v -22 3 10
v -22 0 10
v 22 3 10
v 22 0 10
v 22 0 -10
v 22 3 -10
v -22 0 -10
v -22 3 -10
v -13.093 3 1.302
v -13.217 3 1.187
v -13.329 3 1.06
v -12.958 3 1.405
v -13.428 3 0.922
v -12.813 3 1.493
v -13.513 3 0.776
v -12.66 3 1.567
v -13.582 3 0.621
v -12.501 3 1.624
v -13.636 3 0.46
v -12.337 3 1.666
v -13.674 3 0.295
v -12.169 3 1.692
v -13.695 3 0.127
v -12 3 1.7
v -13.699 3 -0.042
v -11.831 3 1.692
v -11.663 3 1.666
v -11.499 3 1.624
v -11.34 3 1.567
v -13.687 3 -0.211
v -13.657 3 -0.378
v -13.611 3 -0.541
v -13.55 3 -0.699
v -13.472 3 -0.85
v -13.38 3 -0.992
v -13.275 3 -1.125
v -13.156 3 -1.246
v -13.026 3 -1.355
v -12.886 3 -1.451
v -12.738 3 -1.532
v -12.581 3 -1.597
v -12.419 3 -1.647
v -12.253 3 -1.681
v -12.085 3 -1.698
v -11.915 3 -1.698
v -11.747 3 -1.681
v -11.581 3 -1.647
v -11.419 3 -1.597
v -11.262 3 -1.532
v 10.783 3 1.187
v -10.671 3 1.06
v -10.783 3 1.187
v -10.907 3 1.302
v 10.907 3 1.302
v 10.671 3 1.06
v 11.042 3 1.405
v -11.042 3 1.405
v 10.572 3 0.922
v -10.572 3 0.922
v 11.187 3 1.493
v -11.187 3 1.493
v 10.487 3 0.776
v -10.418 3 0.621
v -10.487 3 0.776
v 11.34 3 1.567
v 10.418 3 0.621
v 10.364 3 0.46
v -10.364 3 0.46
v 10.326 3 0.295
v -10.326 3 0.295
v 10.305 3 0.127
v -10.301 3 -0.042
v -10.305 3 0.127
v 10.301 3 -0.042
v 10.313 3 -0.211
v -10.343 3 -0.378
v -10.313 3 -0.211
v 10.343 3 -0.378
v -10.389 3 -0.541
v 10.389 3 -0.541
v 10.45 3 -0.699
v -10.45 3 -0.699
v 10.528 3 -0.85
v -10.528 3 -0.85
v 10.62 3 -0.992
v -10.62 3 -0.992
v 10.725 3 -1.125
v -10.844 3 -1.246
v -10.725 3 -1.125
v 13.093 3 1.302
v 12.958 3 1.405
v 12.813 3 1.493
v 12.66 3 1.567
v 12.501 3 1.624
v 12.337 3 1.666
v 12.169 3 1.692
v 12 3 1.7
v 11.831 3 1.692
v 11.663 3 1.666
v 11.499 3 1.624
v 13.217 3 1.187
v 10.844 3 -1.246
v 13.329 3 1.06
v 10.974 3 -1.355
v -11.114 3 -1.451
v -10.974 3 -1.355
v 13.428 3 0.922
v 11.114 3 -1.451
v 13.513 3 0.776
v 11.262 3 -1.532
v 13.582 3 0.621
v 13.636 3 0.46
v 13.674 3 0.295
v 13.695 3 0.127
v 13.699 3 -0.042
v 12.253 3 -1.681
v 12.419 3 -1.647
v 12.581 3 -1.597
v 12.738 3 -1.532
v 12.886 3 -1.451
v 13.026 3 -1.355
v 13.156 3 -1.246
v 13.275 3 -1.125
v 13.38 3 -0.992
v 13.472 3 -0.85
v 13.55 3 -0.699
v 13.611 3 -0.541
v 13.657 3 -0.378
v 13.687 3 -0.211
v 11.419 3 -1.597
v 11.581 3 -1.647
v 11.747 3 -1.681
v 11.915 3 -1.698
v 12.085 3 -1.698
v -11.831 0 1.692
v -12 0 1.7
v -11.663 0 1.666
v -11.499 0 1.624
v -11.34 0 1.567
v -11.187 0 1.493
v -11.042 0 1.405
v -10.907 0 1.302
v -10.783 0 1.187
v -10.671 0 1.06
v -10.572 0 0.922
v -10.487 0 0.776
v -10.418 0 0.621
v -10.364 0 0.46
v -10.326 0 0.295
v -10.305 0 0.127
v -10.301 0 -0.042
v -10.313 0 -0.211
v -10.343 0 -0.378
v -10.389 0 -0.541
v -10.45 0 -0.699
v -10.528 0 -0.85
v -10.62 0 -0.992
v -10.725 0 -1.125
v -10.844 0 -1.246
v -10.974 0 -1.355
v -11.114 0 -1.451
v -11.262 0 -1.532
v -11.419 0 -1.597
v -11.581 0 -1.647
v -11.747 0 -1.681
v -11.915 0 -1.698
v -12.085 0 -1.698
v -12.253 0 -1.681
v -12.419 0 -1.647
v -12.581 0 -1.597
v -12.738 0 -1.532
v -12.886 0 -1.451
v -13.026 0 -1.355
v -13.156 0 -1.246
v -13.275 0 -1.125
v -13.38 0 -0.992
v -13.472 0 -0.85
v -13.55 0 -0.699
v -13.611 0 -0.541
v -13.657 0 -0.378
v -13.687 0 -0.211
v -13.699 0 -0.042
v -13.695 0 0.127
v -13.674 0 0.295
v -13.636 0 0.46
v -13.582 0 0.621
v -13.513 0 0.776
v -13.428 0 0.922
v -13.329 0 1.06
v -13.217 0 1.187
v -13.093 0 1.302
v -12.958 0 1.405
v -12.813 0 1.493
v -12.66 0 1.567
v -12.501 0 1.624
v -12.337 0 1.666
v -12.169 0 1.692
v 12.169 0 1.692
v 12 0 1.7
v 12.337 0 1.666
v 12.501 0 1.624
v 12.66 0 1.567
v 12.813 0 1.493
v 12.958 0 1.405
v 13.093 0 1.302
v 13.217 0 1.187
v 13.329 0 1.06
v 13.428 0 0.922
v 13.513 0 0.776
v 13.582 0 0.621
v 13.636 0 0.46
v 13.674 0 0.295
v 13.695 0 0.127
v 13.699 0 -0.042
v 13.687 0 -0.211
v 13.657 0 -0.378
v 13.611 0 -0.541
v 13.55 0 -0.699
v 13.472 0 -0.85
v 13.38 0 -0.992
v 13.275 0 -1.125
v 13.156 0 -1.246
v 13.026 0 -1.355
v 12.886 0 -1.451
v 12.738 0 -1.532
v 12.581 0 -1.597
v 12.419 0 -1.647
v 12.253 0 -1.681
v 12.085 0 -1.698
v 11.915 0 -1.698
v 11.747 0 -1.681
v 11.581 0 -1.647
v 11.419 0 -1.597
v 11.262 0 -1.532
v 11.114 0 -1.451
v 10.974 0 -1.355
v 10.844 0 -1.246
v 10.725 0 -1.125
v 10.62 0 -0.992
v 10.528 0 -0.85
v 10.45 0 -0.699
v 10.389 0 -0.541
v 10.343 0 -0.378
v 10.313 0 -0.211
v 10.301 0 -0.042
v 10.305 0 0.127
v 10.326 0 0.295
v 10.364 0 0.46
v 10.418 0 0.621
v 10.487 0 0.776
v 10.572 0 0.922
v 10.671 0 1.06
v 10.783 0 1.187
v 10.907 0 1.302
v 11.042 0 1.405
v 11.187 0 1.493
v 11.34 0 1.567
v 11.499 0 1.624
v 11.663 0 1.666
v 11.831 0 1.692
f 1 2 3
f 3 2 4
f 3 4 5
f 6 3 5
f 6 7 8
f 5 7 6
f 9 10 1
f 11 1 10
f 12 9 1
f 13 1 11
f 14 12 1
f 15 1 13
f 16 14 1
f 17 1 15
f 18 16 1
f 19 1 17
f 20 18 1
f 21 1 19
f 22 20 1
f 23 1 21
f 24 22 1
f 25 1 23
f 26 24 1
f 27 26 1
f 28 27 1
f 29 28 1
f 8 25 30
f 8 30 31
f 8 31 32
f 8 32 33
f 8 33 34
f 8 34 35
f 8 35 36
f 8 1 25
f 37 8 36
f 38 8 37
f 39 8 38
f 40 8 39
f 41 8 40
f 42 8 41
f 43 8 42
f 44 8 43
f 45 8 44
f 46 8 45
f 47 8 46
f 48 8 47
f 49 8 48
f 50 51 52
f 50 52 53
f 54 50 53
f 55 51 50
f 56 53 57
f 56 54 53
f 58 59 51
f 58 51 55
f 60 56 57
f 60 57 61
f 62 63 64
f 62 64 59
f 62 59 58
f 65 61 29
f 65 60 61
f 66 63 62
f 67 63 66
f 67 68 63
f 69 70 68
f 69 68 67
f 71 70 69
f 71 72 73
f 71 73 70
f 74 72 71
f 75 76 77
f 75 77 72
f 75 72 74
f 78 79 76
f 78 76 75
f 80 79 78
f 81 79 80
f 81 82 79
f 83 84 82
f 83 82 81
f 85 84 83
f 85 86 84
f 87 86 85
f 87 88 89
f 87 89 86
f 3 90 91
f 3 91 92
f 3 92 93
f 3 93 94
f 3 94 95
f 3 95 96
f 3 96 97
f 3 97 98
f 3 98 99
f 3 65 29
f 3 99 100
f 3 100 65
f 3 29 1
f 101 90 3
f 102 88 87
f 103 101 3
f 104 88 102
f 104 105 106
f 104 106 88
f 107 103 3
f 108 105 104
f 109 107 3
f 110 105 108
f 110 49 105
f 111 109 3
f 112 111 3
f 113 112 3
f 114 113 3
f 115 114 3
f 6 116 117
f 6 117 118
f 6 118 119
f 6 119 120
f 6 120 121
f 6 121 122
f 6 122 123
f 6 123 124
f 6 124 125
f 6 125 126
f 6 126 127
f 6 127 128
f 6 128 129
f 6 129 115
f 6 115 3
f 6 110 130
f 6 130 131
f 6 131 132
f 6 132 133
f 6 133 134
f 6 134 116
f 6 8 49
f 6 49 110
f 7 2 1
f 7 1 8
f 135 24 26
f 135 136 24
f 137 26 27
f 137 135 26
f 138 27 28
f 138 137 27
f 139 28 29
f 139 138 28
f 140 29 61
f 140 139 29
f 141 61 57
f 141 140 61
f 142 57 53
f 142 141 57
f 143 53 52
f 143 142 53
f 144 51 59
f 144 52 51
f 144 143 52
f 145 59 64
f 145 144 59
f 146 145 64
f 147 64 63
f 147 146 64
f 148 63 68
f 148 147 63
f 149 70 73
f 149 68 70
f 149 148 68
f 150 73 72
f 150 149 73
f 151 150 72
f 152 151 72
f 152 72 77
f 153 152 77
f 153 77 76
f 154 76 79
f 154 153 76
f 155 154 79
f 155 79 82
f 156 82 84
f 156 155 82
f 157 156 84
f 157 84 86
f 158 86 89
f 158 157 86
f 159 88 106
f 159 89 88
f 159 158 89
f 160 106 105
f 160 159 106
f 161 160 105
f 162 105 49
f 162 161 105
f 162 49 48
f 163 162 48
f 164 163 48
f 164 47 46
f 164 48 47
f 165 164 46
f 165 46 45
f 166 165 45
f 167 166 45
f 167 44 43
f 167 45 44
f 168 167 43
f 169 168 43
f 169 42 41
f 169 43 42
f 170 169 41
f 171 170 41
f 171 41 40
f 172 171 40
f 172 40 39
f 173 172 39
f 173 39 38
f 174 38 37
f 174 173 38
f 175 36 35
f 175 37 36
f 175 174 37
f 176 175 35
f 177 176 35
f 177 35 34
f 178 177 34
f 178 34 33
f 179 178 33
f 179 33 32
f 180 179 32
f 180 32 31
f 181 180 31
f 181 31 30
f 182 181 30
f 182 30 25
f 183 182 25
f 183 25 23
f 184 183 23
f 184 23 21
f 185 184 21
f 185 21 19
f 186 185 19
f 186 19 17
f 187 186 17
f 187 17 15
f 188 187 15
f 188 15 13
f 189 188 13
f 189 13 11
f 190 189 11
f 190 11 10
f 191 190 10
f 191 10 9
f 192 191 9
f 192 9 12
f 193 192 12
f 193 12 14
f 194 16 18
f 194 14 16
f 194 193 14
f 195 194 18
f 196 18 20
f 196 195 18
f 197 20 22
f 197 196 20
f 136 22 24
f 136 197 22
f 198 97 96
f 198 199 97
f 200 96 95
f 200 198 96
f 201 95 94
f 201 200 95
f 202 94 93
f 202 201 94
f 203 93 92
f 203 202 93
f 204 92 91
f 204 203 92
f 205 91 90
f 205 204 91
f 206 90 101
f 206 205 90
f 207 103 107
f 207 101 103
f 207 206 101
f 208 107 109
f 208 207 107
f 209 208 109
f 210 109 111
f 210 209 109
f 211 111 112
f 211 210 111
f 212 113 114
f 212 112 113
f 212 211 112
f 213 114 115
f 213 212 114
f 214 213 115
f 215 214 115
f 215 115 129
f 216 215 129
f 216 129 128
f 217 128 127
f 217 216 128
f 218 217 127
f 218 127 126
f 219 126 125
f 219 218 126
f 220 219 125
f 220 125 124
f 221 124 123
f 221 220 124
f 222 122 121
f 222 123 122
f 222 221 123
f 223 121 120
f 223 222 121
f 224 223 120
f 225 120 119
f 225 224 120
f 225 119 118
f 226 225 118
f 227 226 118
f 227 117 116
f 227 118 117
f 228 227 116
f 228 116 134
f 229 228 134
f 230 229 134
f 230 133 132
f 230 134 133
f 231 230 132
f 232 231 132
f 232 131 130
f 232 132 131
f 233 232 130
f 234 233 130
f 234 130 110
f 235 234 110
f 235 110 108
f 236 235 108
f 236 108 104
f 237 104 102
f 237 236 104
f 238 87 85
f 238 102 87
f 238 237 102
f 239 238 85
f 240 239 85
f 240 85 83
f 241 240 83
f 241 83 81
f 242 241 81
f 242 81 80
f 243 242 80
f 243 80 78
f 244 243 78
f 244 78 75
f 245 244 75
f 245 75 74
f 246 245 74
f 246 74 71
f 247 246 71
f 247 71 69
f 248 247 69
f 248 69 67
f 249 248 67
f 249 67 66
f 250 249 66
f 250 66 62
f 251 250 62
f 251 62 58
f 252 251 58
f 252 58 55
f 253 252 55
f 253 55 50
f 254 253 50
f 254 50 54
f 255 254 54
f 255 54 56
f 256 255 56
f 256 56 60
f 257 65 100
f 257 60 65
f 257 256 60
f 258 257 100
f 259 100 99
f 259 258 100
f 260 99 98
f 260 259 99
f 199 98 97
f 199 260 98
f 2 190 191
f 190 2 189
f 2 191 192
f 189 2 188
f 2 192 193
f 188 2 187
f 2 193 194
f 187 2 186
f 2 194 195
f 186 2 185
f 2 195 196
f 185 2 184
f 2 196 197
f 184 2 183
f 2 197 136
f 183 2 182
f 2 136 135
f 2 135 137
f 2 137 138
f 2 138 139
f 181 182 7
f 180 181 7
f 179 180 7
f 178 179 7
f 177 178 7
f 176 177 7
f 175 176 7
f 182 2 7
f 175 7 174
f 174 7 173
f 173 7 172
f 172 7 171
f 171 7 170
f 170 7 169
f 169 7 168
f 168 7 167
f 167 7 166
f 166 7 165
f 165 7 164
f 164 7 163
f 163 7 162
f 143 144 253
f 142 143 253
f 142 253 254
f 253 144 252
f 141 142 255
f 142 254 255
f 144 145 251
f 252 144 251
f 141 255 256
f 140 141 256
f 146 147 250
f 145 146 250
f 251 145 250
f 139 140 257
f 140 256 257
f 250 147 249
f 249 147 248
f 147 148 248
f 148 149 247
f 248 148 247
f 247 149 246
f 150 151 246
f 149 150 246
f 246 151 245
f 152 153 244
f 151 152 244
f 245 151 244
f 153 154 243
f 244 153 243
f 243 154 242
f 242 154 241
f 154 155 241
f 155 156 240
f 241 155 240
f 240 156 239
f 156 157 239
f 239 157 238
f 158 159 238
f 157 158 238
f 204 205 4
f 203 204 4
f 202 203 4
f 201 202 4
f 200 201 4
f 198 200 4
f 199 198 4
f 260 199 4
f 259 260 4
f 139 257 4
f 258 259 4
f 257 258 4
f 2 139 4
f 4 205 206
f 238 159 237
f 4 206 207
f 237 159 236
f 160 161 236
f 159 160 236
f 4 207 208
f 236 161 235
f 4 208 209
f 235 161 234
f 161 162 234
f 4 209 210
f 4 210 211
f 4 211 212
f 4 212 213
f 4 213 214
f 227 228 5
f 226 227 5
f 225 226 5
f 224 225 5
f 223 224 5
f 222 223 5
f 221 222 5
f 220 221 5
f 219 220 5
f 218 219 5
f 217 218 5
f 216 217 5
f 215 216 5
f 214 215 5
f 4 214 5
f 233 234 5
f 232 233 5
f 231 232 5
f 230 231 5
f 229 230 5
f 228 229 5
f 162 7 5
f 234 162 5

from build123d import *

# Parameters (mm, degrees)
SKETCH1_W             = 44
SKETCH1_H             = 20
JOINER_PLATE_DEPTH    = 3
BOLT_HOLES_DEPTH      = 25.351591324
BOLT_HOLES_DEPTH_BACK = 25.351591324
SKETCH2_R             = 1.7


with BuildPart() as part:
    # Sketch1 → Joiner Plate (new body)
    with BuildSketch(Plane(origin=(0, 0, 0), x_dir=(1, 0, 0), z_dir=(0, 1, 0))):
        Rectangle(SKETCH1_W, SKETCH1_H)
    extrude(amount=JOINER_PLATE_DEPTH)

    # Sketch2 → Bolt Holes (cut, two sides: drawn at the far end of the back side and taken through both)
    with BuildSketch(Plane(origin=(0, 0, 0), x_dir=(1, 0, 0), z_dir=(0, 1, 0)).offset(-BOLT_HOLES_DEPTH_BACK)):
        with Locations(Location((-12, 0, 0), (0, 0, 270))):
            Circle(SKETCH2_R)
        with Locations(Location((12, 0, 0), (0, 0, 270))):
            Circle(SKETCH2_R)
    extrude(amount=BOLT_HOLES_DEPTH + BOLT_HOLES_DEPTH_BACK, mode=Mode.SUBTRACT)


solid = part.part
